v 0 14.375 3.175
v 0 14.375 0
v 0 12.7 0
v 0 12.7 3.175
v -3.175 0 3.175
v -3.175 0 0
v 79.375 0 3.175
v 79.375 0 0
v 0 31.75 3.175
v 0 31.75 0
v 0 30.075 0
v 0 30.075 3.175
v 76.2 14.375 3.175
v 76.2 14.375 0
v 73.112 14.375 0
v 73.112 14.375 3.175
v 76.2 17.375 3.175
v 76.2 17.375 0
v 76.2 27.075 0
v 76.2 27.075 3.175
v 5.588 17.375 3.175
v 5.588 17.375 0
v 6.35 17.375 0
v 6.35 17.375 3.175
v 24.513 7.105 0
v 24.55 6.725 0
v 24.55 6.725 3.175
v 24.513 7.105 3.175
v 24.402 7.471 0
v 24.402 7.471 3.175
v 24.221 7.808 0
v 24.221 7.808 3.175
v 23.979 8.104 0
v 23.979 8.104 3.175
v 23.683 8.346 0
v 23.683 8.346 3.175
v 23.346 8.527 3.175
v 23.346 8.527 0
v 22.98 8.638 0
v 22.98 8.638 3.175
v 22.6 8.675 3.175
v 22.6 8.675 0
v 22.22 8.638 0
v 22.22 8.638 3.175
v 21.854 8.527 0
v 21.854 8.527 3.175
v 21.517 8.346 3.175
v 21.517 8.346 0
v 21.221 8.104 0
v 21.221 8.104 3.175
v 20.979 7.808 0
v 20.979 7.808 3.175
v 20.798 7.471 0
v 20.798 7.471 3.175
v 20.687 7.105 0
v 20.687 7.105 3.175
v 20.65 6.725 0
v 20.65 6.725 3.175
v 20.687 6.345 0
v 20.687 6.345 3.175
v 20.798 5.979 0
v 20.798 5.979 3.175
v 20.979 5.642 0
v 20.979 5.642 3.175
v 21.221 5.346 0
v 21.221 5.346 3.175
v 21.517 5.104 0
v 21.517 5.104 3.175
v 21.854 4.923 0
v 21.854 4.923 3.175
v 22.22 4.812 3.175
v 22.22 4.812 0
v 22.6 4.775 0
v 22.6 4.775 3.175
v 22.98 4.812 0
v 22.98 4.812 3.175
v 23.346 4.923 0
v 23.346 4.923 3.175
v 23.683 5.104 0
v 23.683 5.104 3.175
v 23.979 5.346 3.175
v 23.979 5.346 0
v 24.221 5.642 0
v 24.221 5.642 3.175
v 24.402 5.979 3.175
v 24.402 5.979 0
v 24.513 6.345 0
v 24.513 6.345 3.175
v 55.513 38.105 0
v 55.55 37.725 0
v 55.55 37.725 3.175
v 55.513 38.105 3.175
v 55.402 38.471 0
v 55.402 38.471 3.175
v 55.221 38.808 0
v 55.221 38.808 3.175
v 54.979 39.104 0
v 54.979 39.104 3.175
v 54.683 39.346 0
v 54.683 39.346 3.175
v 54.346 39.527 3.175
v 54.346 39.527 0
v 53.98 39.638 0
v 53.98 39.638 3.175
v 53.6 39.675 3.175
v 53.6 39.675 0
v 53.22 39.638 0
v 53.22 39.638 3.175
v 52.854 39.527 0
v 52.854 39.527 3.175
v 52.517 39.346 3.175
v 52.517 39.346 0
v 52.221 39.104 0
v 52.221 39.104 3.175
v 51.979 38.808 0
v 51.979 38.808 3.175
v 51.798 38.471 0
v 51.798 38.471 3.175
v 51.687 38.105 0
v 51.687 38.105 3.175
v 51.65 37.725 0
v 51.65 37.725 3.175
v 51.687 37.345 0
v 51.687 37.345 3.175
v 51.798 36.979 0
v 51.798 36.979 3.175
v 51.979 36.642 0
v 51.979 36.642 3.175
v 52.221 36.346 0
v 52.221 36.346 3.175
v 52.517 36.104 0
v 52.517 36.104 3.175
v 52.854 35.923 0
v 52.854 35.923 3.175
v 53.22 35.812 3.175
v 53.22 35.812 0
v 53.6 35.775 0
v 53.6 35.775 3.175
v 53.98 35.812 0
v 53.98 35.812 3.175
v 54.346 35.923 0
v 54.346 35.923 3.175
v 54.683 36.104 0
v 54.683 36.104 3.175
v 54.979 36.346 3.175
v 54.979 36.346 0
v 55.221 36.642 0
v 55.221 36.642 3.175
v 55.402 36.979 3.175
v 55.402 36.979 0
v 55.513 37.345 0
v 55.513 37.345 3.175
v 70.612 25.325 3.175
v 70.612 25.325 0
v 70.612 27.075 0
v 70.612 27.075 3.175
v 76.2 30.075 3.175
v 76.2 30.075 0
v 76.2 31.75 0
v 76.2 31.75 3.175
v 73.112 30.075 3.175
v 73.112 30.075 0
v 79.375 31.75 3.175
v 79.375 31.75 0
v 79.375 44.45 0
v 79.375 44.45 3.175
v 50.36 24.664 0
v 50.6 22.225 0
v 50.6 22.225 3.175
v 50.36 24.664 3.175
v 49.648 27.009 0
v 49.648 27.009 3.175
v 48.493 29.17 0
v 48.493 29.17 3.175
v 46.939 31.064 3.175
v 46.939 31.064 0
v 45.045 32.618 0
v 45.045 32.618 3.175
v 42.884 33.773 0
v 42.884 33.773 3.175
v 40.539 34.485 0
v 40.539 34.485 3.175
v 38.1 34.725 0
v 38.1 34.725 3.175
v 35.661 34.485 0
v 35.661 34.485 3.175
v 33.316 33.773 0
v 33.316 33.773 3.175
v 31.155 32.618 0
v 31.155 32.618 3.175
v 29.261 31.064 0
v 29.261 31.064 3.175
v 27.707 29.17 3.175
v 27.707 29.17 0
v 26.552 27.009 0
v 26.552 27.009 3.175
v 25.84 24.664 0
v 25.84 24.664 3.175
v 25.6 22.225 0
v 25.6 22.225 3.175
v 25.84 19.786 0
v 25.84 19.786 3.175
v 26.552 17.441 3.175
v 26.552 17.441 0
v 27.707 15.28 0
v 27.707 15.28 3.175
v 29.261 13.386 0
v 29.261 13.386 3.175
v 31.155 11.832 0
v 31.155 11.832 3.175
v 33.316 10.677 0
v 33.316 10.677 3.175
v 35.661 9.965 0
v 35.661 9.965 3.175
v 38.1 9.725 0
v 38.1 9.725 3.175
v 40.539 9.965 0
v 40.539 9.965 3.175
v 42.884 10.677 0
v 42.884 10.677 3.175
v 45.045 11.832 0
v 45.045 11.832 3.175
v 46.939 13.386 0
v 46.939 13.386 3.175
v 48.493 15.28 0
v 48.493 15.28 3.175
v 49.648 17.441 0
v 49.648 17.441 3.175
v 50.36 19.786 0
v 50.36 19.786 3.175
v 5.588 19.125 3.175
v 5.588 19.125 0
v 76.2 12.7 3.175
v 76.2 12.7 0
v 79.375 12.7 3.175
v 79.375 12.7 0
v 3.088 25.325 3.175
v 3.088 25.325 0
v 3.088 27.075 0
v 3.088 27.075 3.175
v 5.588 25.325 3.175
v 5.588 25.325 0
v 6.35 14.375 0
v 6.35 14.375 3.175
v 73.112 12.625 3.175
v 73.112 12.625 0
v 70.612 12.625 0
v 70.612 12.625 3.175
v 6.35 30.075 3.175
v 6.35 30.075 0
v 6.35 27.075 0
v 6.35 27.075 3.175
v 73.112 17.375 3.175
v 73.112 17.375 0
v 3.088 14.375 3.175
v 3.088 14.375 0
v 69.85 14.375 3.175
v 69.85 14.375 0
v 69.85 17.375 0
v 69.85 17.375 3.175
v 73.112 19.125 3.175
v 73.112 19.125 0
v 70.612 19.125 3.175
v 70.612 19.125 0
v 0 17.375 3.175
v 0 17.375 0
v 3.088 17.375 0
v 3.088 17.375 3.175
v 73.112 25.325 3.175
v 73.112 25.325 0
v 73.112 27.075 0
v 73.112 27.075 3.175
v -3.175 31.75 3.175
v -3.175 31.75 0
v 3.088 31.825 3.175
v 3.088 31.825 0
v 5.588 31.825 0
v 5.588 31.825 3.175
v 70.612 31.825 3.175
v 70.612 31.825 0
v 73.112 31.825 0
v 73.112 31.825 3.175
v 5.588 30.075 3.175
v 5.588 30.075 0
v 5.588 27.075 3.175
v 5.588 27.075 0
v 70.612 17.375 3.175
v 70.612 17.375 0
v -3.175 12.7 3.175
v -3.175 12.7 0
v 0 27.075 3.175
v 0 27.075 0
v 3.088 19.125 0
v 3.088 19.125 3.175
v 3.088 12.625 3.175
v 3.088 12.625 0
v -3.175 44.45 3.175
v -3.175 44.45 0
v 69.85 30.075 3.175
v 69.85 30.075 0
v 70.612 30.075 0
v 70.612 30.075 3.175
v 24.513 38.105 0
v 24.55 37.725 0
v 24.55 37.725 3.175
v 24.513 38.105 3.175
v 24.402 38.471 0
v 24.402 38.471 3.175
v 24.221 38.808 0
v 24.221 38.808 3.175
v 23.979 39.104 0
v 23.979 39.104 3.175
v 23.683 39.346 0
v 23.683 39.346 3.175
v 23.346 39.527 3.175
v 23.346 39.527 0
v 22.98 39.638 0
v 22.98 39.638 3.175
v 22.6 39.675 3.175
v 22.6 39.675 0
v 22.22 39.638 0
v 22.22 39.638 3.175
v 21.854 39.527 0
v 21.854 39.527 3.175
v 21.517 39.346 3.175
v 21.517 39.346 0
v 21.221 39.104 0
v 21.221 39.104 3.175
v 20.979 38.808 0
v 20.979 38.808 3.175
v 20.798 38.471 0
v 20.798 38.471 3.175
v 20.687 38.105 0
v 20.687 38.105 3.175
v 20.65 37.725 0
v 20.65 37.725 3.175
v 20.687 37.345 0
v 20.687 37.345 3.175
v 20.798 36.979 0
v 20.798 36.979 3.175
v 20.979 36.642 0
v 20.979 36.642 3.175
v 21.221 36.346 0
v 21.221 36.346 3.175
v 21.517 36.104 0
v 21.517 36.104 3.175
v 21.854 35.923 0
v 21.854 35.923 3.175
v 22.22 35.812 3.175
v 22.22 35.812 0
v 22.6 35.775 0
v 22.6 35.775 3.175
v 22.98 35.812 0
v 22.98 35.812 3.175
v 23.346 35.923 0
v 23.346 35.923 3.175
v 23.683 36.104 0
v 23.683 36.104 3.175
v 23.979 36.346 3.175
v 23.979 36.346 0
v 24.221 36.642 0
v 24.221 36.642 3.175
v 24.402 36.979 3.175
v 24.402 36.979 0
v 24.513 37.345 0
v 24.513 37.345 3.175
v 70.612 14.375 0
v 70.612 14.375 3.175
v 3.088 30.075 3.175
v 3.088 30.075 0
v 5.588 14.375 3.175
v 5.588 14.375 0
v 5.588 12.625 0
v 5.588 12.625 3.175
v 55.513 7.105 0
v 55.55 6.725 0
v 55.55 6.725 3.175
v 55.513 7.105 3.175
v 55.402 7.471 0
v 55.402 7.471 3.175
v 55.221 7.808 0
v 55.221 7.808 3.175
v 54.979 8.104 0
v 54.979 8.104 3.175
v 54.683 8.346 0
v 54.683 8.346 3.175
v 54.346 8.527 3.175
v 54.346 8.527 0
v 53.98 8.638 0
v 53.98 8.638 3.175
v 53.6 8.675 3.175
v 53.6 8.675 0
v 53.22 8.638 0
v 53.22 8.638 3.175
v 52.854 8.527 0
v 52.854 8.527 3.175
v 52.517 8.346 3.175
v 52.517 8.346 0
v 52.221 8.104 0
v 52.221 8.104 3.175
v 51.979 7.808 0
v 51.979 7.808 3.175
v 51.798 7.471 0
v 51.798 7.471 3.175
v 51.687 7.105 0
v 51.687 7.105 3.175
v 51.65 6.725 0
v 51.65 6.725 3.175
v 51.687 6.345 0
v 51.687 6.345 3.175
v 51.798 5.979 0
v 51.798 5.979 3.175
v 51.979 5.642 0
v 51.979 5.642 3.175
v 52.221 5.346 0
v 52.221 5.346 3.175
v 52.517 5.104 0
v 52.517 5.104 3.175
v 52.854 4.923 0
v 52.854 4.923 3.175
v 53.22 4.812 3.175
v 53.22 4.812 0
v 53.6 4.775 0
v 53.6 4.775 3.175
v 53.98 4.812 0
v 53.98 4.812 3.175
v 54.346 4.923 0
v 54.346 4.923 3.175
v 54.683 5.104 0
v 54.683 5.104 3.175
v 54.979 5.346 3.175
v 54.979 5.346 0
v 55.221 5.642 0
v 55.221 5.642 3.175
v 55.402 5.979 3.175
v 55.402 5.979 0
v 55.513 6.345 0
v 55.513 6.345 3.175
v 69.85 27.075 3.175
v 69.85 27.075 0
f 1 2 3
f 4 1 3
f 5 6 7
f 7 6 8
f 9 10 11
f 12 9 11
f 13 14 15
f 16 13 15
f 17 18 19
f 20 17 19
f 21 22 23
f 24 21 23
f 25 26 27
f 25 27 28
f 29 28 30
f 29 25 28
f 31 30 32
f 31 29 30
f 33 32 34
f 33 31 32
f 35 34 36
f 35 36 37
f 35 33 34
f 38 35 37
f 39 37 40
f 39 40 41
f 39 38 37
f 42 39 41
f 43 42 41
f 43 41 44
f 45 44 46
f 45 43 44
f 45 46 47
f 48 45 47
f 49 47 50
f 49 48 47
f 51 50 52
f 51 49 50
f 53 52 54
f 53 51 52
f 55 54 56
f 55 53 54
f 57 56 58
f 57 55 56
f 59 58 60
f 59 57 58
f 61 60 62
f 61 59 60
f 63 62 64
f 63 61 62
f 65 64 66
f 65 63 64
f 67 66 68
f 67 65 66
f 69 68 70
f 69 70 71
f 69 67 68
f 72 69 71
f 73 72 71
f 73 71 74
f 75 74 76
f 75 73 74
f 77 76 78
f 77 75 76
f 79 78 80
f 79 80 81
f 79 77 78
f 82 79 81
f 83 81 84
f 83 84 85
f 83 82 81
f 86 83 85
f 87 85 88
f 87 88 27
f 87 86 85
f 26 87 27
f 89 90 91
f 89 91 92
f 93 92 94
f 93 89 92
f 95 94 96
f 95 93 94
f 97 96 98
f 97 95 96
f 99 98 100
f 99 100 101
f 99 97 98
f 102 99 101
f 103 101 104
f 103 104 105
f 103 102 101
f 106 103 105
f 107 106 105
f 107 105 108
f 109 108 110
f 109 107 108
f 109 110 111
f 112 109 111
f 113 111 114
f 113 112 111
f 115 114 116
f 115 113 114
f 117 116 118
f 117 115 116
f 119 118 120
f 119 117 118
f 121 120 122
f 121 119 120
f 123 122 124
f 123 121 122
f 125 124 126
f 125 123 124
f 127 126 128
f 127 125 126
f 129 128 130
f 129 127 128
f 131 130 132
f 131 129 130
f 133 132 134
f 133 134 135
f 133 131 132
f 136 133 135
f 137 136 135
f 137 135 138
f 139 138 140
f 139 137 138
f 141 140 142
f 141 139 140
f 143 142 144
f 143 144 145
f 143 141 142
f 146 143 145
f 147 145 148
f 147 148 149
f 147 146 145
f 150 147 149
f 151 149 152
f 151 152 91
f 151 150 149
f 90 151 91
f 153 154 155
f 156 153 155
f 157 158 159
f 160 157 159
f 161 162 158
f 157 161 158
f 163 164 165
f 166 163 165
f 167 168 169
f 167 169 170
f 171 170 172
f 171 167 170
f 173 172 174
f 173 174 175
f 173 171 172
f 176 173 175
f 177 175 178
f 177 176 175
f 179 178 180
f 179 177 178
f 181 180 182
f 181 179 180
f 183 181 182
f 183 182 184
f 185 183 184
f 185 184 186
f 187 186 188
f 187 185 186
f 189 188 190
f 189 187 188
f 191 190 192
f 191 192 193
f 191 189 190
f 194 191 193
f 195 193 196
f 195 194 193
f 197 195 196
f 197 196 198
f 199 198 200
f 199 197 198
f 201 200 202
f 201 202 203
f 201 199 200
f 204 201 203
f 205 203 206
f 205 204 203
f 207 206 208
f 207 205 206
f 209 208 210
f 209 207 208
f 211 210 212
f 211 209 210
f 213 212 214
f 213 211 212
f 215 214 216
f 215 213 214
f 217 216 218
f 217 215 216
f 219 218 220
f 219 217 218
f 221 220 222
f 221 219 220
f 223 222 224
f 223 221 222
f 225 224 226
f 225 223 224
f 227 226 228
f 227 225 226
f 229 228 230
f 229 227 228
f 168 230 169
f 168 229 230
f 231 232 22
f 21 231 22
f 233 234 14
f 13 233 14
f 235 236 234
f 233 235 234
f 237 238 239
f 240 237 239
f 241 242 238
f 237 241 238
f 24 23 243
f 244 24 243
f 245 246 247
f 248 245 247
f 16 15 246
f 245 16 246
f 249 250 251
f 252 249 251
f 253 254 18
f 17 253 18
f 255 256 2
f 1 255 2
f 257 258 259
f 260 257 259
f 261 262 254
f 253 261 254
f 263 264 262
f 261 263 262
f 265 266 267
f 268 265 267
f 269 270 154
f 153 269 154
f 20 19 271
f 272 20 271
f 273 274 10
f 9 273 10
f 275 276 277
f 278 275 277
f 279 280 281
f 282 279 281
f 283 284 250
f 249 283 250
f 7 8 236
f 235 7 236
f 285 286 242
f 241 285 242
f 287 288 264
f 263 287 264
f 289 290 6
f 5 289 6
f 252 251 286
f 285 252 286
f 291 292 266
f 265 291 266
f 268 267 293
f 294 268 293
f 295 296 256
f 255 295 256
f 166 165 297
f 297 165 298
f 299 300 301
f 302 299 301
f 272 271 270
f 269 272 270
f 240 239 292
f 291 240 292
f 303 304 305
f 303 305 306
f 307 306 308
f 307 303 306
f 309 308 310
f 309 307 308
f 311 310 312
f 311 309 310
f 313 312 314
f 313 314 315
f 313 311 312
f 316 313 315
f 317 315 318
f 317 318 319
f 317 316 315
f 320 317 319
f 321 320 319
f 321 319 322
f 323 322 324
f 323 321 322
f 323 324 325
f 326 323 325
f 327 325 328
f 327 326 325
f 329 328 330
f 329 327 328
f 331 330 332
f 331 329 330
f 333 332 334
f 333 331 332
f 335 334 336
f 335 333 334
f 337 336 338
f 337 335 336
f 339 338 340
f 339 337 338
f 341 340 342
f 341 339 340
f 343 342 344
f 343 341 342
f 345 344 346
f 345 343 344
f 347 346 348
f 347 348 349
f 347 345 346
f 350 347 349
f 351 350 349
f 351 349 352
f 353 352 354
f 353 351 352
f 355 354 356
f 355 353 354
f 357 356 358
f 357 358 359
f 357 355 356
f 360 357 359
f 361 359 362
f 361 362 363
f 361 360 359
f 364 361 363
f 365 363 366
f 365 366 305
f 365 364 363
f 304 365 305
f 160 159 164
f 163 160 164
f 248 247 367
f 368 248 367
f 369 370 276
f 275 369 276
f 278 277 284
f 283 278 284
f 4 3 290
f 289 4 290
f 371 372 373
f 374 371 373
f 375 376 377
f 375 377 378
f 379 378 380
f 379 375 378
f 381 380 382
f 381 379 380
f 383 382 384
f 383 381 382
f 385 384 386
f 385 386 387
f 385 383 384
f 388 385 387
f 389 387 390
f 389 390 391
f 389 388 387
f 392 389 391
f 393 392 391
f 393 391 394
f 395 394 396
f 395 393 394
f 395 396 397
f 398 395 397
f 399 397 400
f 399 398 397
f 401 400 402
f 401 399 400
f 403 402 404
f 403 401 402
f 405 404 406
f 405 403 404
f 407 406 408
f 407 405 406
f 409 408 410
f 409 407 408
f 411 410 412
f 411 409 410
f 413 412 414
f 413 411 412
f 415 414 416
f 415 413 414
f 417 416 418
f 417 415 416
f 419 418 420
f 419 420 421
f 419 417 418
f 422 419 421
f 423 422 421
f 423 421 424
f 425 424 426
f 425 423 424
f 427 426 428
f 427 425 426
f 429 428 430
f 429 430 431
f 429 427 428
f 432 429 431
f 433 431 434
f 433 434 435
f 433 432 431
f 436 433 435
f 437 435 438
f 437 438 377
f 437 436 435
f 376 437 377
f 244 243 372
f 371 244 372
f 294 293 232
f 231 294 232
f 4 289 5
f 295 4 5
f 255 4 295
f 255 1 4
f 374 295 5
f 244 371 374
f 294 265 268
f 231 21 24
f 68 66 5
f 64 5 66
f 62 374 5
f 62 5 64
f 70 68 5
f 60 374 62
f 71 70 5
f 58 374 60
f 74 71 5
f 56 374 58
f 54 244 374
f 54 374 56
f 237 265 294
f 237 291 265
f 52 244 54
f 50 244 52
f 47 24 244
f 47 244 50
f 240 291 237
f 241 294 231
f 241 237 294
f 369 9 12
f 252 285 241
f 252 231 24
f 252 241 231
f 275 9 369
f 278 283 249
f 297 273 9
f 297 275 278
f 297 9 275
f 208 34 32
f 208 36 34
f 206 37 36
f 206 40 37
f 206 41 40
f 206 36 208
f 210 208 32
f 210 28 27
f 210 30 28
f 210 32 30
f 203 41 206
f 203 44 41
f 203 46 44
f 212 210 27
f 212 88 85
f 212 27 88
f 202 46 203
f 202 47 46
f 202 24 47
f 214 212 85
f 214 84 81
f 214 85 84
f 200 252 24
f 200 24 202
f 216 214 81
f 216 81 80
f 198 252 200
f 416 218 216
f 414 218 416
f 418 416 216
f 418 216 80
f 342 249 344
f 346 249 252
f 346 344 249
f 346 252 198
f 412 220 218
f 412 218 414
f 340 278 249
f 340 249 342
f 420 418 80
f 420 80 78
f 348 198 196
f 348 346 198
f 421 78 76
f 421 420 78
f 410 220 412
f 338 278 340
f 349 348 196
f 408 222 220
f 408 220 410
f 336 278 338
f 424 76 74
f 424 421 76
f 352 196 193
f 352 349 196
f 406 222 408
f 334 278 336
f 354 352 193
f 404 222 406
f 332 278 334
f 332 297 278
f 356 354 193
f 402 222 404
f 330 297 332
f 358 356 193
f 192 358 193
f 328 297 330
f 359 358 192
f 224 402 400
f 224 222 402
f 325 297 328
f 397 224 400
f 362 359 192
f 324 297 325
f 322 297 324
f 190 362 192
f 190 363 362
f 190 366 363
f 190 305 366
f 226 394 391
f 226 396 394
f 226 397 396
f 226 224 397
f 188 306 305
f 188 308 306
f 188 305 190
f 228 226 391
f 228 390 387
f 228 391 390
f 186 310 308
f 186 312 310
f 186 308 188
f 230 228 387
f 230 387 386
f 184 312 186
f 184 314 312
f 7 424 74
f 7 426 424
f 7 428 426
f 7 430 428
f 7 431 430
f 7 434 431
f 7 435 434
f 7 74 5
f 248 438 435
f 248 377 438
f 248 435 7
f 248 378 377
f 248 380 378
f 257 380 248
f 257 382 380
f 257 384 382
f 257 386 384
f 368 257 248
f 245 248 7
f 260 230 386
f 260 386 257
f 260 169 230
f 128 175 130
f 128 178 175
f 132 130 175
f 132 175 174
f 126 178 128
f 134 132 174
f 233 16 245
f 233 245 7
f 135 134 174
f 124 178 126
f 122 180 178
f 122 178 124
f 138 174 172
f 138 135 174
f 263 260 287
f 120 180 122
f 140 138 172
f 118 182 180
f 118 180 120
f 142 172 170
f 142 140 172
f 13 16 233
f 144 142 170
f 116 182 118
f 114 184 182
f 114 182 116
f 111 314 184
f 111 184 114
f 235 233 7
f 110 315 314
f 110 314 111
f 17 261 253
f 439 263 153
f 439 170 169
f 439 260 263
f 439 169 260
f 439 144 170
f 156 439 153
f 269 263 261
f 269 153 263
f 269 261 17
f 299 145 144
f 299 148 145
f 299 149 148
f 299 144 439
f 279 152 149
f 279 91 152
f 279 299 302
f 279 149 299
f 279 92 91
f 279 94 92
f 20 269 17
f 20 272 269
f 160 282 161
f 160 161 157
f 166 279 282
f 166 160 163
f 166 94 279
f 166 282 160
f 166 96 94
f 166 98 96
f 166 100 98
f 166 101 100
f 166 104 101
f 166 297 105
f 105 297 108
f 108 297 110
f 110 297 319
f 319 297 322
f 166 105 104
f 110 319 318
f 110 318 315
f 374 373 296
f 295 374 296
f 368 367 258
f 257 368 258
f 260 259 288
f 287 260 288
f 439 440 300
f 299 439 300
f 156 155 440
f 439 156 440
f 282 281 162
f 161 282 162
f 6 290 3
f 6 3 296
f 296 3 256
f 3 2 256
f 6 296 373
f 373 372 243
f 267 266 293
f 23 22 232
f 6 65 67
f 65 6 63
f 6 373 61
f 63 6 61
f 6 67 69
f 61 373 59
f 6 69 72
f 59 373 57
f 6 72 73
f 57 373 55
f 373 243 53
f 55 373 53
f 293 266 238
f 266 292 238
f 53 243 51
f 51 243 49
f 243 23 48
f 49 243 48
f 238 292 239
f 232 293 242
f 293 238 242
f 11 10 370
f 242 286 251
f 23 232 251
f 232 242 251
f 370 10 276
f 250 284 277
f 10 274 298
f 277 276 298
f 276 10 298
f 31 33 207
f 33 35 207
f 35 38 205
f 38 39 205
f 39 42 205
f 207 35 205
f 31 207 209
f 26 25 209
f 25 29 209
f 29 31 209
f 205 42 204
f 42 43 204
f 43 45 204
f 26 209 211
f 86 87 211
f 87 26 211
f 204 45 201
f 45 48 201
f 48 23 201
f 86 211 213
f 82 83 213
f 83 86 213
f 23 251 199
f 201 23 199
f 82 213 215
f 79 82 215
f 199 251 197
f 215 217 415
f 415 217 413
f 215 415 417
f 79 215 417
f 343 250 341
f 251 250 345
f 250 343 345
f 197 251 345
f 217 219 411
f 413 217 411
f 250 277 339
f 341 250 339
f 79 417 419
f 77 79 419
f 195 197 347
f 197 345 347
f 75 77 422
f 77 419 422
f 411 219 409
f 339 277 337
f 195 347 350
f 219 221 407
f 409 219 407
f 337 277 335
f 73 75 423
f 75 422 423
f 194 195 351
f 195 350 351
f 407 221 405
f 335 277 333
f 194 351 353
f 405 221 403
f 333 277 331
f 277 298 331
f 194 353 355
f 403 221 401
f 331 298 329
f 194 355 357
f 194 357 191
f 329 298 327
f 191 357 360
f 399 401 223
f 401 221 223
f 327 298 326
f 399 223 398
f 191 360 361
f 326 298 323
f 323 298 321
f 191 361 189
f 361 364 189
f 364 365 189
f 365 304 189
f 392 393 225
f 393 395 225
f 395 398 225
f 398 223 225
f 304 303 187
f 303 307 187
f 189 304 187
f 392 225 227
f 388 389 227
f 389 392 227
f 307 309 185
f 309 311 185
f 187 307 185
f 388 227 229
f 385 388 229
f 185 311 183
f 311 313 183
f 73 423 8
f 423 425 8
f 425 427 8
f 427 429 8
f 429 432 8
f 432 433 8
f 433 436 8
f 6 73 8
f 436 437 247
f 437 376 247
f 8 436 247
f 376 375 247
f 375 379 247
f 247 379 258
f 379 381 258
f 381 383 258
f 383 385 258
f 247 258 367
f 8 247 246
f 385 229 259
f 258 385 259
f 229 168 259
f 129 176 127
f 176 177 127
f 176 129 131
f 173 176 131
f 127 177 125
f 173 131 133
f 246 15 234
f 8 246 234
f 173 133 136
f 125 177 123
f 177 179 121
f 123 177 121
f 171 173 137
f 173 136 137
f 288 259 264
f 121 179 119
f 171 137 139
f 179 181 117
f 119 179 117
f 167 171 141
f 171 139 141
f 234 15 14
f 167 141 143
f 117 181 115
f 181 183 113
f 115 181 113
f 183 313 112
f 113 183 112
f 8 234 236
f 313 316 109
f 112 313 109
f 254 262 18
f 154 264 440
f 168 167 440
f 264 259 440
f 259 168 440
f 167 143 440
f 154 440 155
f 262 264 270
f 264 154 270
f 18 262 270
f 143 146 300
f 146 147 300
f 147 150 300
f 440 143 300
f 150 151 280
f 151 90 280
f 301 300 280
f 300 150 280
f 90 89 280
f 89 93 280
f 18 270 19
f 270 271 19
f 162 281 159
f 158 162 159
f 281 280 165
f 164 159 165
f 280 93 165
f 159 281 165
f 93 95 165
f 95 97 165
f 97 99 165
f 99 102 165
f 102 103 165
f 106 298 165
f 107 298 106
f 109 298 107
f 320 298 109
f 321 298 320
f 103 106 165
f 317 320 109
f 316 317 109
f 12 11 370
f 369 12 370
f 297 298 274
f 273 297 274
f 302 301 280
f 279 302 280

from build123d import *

# Parameters (mm, degrees)
SKETCH2_R           = 1.95
SKETCH2_R_2         = 12.5
BOSS_EXTRUDE1_DEPTH = 3.175


with BuildPart() as part:
    # Sketch2 → Boss-Extrude1 (new body)
    with BuildSketch(Plane.XY):
        Polygon((-3.175, 0), (79.375, 0), (79.375, 12.7), (76.2, 12.7), (76.2, 14.375), (73.112, 14.375), (73.112, 12.625), (70.612, 12.625), (70.612, 14.375), (69.85, 14.375), (69.85, 17.375), (70.612, 17.375), (70.612, 19.125), (73.112, 19.125), (73.112, 17.375), (76.2, 17.375), (76.2, 27.075), (73.112, 27.075), (73.112, 25.325), (70.612, 25.325), (70.612, 27.075), (69.85, 27.075), (69.85, 30.075), (70.612, 30.075), (70.612, 31.825), (73.112, 31.825), (73.112, 30.075), (76.2, 30.075), (76.2, 31.75), (79.375, 31.75), (79.375, 44.45), (-3.175, 44.45), (-3.175, 31.75), (0, 31.75), (0, 30.075), (3.088, 30.075), (3.088, 31.825), (5.588, 31.825), (5.588, 30.075), (6.35, 30.075), (6.35, 27.075), (5.588, 27.075), (5.588, 25.325), (3.088, 25.325), (3.088, 27.075), (0, 27.075), (0, 17.375), (3.088, 17.375), (3.088, 19.125), (5.588, 19.125), (5.588, 17.375), (6.35, 17.375), (6.35, 14.375), (5.588, 14.375), (5.588, 12.625), (3.088, 12.625), (3.088, 14.375), (0, 14.375), (0, 12.7), (-3.175, 12.7), align=None)
        with Locations((22.6, 6.725)):
            Circle(SKETCH2_R, mode=Mode.SUBTRACT)
        with Locations((53.6, 6.725)):
            Circle(SKETCH2_R, mode=Mode.SUBTRACT)
        with Locations((38.1, 22.225)):
            Circle(SKETCH2_R_2, mode=Mode.SUBTRACT)
        with Locations((22.6, 37.725)):
            Circle(SKETCH2_R, mode=Mode.SUBTRACT)
        with Locations((53.6, 37.725)):
            Circle(SKETCH2_R, mode=Mode.SUBTRACT)
    extrude(amount=BOSS_EXTRUDE1_DEPTH)


solid = part.part
